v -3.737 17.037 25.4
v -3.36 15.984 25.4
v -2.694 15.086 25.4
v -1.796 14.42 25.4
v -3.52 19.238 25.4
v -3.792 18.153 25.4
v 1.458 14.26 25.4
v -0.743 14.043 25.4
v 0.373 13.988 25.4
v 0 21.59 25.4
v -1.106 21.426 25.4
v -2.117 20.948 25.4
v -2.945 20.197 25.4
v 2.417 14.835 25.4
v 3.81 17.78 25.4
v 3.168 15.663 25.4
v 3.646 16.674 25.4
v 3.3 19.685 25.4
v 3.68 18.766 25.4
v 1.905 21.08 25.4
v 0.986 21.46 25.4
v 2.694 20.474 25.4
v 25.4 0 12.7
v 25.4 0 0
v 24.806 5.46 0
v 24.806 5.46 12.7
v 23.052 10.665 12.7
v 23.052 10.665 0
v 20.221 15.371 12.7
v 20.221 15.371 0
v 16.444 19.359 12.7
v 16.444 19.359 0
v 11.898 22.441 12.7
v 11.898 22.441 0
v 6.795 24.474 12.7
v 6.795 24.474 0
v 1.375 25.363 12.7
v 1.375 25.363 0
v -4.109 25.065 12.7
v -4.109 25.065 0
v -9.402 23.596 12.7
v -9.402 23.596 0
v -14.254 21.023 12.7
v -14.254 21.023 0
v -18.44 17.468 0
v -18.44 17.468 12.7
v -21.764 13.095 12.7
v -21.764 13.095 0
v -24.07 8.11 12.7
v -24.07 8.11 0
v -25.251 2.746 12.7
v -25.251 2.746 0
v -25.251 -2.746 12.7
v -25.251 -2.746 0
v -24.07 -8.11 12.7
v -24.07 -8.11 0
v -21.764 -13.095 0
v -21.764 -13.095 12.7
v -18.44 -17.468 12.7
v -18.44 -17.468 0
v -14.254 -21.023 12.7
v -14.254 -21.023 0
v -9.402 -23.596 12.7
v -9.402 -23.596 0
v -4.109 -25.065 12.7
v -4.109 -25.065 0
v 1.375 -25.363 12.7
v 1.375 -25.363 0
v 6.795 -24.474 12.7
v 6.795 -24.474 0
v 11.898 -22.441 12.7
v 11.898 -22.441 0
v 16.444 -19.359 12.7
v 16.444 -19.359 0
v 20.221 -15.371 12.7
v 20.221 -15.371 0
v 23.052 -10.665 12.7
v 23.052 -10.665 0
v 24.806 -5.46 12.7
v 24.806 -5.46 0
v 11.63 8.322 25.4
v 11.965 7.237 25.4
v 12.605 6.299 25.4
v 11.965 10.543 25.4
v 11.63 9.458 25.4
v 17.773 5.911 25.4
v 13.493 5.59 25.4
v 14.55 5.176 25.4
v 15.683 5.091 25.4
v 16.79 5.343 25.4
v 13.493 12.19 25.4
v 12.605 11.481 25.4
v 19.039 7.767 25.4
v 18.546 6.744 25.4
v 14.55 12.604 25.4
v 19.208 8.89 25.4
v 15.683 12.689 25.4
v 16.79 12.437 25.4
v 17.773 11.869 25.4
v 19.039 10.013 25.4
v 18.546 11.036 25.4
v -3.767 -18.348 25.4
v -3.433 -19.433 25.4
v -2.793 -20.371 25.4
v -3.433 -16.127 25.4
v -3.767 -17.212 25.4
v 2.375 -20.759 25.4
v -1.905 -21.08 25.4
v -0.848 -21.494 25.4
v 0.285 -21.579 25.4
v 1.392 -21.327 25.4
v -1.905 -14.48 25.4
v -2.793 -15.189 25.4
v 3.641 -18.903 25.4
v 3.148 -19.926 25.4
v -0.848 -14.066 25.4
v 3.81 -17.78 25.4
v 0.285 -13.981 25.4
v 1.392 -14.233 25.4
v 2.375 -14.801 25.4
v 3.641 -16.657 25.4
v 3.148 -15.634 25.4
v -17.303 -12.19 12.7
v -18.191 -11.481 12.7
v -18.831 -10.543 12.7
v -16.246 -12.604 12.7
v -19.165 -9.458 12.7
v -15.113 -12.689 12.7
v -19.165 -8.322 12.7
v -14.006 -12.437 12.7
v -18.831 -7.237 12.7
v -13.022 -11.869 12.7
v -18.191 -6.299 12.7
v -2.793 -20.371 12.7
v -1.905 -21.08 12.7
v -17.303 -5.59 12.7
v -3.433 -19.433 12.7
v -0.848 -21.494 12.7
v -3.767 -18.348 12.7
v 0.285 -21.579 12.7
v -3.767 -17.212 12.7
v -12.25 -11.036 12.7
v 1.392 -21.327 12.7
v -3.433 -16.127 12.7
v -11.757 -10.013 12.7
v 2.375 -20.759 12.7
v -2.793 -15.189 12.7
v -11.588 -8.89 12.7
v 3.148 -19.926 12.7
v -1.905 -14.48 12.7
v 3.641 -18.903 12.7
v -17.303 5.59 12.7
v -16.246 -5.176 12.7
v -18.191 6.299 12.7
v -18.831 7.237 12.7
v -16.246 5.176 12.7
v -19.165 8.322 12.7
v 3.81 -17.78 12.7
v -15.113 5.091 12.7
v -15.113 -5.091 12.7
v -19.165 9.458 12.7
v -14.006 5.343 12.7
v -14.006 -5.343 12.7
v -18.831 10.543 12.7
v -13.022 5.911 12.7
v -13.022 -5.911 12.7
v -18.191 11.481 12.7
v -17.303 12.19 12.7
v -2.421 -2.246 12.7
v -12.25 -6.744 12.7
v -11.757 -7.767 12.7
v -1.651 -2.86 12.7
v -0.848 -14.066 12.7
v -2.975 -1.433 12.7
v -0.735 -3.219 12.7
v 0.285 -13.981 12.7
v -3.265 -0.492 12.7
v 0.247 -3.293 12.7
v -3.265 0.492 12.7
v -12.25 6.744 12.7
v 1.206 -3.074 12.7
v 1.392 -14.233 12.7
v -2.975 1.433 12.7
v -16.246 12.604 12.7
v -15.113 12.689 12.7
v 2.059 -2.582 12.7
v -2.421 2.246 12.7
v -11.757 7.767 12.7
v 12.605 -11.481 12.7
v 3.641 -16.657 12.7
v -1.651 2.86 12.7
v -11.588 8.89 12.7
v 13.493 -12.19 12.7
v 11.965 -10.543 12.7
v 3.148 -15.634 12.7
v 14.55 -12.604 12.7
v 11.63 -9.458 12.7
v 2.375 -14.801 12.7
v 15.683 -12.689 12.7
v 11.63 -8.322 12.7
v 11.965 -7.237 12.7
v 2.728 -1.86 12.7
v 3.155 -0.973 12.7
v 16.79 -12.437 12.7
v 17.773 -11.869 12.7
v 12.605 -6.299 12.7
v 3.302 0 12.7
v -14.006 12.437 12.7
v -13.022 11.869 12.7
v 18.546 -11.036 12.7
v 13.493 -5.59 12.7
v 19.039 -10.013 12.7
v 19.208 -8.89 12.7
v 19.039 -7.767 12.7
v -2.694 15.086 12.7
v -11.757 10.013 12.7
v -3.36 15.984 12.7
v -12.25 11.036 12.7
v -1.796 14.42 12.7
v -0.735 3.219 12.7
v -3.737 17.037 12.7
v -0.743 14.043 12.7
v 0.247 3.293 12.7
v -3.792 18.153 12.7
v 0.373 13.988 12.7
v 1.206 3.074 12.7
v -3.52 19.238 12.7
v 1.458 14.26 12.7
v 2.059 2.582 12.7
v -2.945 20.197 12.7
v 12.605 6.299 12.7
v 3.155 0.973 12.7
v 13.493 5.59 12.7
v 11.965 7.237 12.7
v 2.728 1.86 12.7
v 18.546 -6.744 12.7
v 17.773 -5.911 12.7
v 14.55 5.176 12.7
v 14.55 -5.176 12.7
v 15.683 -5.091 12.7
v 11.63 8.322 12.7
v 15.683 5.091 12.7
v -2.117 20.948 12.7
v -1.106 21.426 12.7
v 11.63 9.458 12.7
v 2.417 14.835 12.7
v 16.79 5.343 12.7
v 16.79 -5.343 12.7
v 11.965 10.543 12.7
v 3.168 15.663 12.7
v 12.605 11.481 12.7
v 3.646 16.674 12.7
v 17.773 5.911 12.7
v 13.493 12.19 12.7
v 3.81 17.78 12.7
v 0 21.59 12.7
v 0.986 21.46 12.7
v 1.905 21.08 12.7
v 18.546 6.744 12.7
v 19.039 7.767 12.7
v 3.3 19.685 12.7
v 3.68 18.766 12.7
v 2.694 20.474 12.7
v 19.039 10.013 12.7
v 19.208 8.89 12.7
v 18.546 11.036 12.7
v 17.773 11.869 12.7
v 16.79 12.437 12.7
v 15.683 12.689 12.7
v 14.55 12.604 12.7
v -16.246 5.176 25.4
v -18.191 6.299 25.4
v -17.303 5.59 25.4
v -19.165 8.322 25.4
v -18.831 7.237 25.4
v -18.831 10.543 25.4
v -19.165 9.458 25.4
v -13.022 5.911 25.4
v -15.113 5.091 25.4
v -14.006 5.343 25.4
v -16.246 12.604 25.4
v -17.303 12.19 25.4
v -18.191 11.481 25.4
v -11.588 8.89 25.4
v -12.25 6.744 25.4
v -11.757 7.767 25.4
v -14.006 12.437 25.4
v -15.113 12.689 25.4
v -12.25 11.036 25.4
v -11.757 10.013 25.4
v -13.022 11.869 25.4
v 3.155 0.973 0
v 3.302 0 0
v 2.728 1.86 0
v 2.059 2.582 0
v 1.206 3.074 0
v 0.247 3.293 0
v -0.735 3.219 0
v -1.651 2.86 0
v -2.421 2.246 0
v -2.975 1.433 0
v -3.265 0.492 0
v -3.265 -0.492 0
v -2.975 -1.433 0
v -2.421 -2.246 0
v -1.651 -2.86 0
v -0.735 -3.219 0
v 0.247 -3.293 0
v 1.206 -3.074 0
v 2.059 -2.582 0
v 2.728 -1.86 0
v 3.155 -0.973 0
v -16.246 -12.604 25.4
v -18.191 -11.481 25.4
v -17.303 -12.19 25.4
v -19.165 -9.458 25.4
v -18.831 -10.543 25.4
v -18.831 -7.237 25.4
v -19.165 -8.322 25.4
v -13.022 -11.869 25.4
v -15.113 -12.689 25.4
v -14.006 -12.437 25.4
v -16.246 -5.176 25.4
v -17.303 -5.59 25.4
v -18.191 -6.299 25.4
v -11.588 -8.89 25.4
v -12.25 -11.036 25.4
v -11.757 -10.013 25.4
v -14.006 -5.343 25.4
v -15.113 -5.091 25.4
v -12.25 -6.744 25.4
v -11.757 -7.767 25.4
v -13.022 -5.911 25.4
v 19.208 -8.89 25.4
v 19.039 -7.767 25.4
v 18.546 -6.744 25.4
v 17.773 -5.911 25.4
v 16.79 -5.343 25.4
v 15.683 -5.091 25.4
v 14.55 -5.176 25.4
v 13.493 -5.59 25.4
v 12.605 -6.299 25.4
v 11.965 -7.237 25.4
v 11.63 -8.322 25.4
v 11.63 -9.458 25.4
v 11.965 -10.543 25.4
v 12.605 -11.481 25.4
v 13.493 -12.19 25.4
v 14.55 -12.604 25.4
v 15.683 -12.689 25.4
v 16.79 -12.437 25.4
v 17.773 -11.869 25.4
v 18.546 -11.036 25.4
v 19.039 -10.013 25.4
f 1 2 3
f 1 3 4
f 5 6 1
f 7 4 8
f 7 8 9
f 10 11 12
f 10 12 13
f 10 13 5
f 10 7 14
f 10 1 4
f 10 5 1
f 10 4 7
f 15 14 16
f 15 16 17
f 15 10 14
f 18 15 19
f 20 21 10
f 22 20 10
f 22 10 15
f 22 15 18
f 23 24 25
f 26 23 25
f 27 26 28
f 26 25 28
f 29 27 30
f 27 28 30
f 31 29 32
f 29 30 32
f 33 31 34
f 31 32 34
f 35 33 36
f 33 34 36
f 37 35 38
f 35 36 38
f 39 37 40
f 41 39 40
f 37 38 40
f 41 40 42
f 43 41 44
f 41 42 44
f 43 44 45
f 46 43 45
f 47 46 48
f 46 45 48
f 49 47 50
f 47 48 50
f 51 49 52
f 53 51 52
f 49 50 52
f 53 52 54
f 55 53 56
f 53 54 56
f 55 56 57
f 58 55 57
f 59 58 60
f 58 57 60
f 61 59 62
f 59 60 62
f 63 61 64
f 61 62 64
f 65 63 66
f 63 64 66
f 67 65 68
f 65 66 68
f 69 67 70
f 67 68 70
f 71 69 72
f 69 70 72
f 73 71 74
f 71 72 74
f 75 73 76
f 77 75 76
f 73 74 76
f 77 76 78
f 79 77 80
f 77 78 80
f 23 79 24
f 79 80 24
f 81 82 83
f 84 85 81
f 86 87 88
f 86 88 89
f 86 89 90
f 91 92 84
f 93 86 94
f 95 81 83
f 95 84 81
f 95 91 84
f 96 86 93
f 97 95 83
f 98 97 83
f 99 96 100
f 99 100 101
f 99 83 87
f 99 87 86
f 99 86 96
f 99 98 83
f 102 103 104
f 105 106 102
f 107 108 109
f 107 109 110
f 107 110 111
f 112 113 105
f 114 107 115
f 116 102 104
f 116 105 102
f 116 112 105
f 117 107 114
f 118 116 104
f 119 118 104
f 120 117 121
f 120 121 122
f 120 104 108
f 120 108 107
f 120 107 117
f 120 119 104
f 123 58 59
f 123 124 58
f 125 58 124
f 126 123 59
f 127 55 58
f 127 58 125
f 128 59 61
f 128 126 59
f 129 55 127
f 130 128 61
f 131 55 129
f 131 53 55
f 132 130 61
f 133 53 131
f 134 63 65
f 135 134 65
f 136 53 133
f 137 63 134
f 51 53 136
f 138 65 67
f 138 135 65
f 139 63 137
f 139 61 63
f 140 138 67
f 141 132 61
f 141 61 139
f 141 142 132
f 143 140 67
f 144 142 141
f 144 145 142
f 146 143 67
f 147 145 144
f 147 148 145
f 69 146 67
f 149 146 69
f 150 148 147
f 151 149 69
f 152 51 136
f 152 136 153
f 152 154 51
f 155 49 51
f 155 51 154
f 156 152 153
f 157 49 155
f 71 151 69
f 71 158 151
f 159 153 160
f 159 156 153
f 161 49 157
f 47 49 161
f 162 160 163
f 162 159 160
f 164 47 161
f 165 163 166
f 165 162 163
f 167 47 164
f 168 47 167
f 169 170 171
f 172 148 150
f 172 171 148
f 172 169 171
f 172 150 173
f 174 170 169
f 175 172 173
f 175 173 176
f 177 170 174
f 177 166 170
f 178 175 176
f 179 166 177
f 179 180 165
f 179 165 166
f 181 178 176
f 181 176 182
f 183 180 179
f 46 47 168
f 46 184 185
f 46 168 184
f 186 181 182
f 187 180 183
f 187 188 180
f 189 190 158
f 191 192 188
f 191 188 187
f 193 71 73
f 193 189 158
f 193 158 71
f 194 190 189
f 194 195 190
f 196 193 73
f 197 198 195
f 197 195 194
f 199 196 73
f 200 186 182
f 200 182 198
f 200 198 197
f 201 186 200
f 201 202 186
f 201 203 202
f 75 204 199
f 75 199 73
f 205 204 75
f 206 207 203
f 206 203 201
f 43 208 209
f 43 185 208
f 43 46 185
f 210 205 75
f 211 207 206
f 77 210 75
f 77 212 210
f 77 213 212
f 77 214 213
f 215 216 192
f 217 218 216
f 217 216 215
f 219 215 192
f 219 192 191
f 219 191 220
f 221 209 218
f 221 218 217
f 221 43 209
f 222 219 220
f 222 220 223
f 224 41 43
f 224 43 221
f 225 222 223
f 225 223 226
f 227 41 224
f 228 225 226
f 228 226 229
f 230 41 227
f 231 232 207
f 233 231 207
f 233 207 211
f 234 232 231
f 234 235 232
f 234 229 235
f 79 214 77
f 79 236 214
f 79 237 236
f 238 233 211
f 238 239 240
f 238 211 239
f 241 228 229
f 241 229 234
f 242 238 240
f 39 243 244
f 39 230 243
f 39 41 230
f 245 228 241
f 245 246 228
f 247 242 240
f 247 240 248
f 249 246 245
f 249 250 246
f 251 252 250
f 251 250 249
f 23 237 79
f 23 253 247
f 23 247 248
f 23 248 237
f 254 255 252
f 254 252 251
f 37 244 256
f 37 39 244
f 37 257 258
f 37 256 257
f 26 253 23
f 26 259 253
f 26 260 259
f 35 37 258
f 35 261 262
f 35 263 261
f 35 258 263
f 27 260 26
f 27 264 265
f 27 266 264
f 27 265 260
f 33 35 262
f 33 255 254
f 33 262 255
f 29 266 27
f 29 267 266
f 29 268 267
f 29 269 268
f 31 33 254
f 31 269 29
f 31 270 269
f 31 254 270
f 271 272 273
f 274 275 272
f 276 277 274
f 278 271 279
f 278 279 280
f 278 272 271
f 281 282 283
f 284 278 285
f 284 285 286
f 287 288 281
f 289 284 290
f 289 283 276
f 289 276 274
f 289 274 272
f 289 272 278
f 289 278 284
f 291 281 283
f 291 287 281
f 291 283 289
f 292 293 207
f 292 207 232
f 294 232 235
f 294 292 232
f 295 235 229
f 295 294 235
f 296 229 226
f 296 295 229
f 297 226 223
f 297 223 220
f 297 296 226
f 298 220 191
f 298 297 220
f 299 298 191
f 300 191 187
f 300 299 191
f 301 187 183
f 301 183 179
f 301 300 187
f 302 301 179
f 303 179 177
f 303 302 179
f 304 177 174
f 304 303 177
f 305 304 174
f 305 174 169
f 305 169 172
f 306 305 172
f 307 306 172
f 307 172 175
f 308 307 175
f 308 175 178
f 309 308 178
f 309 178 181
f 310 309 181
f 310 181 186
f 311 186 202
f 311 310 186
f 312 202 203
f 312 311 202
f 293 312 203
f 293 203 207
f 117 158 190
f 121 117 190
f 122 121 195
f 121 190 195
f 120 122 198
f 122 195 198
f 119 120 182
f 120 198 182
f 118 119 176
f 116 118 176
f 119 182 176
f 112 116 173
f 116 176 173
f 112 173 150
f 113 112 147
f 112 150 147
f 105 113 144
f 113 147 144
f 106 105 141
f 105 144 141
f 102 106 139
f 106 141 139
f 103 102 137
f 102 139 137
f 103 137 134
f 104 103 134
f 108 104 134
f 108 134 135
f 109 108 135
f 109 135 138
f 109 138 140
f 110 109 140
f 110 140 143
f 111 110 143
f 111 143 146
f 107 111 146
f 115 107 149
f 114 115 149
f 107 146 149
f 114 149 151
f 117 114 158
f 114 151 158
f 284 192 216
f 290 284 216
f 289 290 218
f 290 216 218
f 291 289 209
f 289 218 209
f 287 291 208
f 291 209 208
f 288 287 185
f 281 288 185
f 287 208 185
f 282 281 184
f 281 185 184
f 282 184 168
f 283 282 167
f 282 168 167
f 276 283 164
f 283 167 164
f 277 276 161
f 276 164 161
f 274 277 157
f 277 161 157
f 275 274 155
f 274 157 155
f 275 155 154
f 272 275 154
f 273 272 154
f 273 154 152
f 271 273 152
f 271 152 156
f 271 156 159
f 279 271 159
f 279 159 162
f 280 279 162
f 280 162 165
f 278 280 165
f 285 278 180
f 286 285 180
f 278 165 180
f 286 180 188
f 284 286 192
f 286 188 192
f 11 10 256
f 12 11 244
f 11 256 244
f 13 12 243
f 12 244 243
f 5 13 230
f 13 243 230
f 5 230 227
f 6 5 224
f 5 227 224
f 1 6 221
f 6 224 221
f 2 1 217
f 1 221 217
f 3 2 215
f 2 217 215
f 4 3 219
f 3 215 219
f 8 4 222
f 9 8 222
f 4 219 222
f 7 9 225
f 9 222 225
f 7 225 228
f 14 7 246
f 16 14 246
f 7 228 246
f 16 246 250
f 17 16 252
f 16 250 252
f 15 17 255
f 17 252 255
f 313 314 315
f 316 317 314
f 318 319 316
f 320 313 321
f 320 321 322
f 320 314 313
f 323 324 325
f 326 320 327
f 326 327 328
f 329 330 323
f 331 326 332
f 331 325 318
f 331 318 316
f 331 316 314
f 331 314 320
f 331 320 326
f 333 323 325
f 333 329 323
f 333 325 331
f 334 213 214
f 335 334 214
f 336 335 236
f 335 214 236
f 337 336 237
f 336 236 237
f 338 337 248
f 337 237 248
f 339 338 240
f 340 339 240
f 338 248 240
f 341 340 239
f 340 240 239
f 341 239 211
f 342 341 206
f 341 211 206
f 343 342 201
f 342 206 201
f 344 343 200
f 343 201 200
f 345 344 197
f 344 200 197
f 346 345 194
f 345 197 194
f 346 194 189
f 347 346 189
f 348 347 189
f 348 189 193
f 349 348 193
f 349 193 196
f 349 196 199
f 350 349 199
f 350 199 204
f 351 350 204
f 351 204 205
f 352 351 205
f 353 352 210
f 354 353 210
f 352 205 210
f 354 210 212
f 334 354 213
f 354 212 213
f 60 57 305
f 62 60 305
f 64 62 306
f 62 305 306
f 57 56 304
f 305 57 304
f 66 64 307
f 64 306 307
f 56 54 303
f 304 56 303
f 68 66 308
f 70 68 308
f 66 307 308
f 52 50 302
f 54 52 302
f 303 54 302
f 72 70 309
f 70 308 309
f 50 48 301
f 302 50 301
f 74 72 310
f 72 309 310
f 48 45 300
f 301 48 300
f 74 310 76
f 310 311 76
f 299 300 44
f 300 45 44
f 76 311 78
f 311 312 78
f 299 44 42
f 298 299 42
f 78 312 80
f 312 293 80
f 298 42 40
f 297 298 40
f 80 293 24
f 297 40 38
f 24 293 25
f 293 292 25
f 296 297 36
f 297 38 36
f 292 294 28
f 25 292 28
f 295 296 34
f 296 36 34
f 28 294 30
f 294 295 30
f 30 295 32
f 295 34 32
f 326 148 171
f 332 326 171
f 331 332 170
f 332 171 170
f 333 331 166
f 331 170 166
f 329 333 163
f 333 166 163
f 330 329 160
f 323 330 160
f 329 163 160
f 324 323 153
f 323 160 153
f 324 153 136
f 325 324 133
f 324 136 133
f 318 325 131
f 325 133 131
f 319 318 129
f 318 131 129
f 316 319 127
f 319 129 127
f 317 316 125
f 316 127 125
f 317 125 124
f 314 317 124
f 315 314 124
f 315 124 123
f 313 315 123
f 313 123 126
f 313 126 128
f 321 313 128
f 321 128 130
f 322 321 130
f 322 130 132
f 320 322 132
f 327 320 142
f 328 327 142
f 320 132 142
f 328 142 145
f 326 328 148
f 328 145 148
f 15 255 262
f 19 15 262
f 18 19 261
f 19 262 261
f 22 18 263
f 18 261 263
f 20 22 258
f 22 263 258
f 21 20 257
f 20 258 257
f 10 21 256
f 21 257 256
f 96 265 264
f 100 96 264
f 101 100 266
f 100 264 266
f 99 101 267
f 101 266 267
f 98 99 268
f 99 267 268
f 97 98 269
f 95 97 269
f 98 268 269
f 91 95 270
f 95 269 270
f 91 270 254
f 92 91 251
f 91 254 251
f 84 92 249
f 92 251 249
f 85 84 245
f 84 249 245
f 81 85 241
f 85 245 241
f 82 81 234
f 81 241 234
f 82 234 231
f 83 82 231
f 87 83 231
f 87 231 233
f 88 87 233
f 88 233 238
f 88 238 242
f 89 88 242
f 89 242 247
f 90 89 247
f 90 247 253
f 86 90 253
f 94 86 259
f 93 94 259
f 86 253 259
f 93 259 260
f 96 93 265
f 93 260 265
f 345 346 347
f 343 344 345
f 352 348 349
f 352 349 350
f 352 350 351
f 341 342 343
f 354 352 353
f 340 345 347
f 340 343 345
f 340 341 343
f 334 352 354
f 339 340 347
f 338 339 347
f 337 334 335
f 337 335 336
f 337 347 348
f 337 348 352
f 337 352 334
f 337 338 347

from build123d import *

# Parameters (mm, degrees)
F0_R     = 25.4
F0_R_2   = 3.302
F1_DEPTH = 12.7
F2_R     = 3.81
F3_DEPTH = 12.7


with BuildPart() as f1:
    # F0 (on Top) → F1 (new body)
    with BuildSketch(Plane.XY):
        Circle(F0_R)
        Circle(F0_R_2, mode=Mode.SUBTRACT)
    extrude(amount=F1_DEPTH)

    # F2 (on face) → F3 (join)
    with BuildSketch(Plane.XY.offset(12.7)):
        with BuildLine():
            ThreePointArc((0, 21.59), (-2.694077, 15.085923), (3.81, 17.78))
            ThreePointArc((3.81, 17.78), (2.694077, 20.474077), (0, 21.59))
        make_face()
        with Locations((-15.397932, 8.89)):
            Circle(F2_R)
        with Locations((-15.397932, -8.89)):
            Circle(F2_R)
        with Locations((0, -17.78)):
            Circle(F2_R)
        with Locations((15.397932, -8.89)):
            Circle(F2_R)
        with Locations((15.397932, 8.89)):
            Circle(F2_R)
    extrude(amount=F3_DEPTH)


solid = f1.part
